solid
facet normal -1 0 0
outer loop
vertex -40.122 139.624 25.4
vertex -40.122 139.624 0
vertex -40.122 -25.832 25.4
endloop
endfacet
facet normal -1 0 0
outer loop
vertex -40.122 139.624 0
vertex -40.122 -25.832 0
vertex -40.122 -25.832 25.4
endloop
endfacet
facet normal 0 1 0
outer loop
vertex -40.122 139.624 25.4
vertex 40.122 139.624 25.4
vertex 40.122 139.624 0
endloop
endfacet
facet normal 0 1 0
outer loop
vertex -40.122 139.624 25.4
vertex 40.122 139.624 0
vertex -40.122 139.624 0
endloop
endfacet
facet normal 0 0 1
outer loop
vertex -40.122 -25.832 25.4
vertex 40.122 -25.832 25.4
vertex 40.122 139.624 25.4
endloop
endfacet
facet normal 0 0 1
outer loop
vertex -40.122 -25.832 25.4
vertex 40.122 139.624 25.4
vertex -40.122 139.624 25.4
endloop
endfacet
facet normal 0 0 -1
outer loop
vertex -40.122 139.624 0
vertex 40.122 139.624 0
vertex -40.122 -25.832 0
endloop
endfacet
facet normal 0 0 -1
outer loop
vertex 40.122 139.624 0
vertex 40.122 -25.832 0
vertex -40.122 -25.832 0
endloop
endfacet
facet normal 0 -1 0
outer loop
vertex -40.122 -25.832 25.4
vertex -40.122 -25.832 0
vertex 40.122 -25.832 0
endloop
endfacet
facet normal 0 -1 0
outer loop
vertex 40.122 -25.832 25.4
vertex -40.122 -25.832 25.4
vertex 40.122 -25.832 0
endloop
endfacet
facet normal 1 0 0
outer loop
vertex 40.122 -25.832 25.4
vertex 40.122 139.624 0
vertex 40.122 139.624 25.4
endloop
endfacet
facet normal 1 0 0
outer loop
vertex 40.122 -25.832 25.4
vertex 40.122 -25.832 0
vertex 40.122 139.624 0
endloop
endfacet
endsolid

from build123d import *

# Parameters (mm, degrees)
F0_W      = 80.244028
F0_H      = 51.663946
F2_DEPTH  = 25.4
F1_R      = 12.351096
F3_DEPTH  = 25.4
F4_R      = 18.898504
F5_DEPTH  = 25.4
F2_FACE_W = 80.244028
F2_FACE_H = 25.4
F6_DEPTH  = 113.792


with BuildPart() as f2:
    # F0 (on Top) → F2 (new body)
    with BuildSketch(Plane.XY):
        Rectangle(F0_W, F0_H)
    extrude(amount=F2_DEPTH)

    # F1 (on Top) → F3 (join)
    with BuildSketch(Plane.XY):
        Circle(F1_R)
    extrude(amount=F3_DEPTH)

    # F4 (on Top) → F5 (join)
    with BuildSketch(Plane.XY):
        Circle(F4_R)
    extrude(amount=F5_DEPTH)

    # F2_face (on face) → F6 (join)
    with BuildSketch(Plane(origin=(0, 25.831973, 12.7), x_dir=(-1, 0, 0), z_dir=(0, 1, 0))):
        Rectangle(F2_FACE_W, F2_FACE_H)
    extrude(amount=F6_DEPTH)


solid = f2.part
